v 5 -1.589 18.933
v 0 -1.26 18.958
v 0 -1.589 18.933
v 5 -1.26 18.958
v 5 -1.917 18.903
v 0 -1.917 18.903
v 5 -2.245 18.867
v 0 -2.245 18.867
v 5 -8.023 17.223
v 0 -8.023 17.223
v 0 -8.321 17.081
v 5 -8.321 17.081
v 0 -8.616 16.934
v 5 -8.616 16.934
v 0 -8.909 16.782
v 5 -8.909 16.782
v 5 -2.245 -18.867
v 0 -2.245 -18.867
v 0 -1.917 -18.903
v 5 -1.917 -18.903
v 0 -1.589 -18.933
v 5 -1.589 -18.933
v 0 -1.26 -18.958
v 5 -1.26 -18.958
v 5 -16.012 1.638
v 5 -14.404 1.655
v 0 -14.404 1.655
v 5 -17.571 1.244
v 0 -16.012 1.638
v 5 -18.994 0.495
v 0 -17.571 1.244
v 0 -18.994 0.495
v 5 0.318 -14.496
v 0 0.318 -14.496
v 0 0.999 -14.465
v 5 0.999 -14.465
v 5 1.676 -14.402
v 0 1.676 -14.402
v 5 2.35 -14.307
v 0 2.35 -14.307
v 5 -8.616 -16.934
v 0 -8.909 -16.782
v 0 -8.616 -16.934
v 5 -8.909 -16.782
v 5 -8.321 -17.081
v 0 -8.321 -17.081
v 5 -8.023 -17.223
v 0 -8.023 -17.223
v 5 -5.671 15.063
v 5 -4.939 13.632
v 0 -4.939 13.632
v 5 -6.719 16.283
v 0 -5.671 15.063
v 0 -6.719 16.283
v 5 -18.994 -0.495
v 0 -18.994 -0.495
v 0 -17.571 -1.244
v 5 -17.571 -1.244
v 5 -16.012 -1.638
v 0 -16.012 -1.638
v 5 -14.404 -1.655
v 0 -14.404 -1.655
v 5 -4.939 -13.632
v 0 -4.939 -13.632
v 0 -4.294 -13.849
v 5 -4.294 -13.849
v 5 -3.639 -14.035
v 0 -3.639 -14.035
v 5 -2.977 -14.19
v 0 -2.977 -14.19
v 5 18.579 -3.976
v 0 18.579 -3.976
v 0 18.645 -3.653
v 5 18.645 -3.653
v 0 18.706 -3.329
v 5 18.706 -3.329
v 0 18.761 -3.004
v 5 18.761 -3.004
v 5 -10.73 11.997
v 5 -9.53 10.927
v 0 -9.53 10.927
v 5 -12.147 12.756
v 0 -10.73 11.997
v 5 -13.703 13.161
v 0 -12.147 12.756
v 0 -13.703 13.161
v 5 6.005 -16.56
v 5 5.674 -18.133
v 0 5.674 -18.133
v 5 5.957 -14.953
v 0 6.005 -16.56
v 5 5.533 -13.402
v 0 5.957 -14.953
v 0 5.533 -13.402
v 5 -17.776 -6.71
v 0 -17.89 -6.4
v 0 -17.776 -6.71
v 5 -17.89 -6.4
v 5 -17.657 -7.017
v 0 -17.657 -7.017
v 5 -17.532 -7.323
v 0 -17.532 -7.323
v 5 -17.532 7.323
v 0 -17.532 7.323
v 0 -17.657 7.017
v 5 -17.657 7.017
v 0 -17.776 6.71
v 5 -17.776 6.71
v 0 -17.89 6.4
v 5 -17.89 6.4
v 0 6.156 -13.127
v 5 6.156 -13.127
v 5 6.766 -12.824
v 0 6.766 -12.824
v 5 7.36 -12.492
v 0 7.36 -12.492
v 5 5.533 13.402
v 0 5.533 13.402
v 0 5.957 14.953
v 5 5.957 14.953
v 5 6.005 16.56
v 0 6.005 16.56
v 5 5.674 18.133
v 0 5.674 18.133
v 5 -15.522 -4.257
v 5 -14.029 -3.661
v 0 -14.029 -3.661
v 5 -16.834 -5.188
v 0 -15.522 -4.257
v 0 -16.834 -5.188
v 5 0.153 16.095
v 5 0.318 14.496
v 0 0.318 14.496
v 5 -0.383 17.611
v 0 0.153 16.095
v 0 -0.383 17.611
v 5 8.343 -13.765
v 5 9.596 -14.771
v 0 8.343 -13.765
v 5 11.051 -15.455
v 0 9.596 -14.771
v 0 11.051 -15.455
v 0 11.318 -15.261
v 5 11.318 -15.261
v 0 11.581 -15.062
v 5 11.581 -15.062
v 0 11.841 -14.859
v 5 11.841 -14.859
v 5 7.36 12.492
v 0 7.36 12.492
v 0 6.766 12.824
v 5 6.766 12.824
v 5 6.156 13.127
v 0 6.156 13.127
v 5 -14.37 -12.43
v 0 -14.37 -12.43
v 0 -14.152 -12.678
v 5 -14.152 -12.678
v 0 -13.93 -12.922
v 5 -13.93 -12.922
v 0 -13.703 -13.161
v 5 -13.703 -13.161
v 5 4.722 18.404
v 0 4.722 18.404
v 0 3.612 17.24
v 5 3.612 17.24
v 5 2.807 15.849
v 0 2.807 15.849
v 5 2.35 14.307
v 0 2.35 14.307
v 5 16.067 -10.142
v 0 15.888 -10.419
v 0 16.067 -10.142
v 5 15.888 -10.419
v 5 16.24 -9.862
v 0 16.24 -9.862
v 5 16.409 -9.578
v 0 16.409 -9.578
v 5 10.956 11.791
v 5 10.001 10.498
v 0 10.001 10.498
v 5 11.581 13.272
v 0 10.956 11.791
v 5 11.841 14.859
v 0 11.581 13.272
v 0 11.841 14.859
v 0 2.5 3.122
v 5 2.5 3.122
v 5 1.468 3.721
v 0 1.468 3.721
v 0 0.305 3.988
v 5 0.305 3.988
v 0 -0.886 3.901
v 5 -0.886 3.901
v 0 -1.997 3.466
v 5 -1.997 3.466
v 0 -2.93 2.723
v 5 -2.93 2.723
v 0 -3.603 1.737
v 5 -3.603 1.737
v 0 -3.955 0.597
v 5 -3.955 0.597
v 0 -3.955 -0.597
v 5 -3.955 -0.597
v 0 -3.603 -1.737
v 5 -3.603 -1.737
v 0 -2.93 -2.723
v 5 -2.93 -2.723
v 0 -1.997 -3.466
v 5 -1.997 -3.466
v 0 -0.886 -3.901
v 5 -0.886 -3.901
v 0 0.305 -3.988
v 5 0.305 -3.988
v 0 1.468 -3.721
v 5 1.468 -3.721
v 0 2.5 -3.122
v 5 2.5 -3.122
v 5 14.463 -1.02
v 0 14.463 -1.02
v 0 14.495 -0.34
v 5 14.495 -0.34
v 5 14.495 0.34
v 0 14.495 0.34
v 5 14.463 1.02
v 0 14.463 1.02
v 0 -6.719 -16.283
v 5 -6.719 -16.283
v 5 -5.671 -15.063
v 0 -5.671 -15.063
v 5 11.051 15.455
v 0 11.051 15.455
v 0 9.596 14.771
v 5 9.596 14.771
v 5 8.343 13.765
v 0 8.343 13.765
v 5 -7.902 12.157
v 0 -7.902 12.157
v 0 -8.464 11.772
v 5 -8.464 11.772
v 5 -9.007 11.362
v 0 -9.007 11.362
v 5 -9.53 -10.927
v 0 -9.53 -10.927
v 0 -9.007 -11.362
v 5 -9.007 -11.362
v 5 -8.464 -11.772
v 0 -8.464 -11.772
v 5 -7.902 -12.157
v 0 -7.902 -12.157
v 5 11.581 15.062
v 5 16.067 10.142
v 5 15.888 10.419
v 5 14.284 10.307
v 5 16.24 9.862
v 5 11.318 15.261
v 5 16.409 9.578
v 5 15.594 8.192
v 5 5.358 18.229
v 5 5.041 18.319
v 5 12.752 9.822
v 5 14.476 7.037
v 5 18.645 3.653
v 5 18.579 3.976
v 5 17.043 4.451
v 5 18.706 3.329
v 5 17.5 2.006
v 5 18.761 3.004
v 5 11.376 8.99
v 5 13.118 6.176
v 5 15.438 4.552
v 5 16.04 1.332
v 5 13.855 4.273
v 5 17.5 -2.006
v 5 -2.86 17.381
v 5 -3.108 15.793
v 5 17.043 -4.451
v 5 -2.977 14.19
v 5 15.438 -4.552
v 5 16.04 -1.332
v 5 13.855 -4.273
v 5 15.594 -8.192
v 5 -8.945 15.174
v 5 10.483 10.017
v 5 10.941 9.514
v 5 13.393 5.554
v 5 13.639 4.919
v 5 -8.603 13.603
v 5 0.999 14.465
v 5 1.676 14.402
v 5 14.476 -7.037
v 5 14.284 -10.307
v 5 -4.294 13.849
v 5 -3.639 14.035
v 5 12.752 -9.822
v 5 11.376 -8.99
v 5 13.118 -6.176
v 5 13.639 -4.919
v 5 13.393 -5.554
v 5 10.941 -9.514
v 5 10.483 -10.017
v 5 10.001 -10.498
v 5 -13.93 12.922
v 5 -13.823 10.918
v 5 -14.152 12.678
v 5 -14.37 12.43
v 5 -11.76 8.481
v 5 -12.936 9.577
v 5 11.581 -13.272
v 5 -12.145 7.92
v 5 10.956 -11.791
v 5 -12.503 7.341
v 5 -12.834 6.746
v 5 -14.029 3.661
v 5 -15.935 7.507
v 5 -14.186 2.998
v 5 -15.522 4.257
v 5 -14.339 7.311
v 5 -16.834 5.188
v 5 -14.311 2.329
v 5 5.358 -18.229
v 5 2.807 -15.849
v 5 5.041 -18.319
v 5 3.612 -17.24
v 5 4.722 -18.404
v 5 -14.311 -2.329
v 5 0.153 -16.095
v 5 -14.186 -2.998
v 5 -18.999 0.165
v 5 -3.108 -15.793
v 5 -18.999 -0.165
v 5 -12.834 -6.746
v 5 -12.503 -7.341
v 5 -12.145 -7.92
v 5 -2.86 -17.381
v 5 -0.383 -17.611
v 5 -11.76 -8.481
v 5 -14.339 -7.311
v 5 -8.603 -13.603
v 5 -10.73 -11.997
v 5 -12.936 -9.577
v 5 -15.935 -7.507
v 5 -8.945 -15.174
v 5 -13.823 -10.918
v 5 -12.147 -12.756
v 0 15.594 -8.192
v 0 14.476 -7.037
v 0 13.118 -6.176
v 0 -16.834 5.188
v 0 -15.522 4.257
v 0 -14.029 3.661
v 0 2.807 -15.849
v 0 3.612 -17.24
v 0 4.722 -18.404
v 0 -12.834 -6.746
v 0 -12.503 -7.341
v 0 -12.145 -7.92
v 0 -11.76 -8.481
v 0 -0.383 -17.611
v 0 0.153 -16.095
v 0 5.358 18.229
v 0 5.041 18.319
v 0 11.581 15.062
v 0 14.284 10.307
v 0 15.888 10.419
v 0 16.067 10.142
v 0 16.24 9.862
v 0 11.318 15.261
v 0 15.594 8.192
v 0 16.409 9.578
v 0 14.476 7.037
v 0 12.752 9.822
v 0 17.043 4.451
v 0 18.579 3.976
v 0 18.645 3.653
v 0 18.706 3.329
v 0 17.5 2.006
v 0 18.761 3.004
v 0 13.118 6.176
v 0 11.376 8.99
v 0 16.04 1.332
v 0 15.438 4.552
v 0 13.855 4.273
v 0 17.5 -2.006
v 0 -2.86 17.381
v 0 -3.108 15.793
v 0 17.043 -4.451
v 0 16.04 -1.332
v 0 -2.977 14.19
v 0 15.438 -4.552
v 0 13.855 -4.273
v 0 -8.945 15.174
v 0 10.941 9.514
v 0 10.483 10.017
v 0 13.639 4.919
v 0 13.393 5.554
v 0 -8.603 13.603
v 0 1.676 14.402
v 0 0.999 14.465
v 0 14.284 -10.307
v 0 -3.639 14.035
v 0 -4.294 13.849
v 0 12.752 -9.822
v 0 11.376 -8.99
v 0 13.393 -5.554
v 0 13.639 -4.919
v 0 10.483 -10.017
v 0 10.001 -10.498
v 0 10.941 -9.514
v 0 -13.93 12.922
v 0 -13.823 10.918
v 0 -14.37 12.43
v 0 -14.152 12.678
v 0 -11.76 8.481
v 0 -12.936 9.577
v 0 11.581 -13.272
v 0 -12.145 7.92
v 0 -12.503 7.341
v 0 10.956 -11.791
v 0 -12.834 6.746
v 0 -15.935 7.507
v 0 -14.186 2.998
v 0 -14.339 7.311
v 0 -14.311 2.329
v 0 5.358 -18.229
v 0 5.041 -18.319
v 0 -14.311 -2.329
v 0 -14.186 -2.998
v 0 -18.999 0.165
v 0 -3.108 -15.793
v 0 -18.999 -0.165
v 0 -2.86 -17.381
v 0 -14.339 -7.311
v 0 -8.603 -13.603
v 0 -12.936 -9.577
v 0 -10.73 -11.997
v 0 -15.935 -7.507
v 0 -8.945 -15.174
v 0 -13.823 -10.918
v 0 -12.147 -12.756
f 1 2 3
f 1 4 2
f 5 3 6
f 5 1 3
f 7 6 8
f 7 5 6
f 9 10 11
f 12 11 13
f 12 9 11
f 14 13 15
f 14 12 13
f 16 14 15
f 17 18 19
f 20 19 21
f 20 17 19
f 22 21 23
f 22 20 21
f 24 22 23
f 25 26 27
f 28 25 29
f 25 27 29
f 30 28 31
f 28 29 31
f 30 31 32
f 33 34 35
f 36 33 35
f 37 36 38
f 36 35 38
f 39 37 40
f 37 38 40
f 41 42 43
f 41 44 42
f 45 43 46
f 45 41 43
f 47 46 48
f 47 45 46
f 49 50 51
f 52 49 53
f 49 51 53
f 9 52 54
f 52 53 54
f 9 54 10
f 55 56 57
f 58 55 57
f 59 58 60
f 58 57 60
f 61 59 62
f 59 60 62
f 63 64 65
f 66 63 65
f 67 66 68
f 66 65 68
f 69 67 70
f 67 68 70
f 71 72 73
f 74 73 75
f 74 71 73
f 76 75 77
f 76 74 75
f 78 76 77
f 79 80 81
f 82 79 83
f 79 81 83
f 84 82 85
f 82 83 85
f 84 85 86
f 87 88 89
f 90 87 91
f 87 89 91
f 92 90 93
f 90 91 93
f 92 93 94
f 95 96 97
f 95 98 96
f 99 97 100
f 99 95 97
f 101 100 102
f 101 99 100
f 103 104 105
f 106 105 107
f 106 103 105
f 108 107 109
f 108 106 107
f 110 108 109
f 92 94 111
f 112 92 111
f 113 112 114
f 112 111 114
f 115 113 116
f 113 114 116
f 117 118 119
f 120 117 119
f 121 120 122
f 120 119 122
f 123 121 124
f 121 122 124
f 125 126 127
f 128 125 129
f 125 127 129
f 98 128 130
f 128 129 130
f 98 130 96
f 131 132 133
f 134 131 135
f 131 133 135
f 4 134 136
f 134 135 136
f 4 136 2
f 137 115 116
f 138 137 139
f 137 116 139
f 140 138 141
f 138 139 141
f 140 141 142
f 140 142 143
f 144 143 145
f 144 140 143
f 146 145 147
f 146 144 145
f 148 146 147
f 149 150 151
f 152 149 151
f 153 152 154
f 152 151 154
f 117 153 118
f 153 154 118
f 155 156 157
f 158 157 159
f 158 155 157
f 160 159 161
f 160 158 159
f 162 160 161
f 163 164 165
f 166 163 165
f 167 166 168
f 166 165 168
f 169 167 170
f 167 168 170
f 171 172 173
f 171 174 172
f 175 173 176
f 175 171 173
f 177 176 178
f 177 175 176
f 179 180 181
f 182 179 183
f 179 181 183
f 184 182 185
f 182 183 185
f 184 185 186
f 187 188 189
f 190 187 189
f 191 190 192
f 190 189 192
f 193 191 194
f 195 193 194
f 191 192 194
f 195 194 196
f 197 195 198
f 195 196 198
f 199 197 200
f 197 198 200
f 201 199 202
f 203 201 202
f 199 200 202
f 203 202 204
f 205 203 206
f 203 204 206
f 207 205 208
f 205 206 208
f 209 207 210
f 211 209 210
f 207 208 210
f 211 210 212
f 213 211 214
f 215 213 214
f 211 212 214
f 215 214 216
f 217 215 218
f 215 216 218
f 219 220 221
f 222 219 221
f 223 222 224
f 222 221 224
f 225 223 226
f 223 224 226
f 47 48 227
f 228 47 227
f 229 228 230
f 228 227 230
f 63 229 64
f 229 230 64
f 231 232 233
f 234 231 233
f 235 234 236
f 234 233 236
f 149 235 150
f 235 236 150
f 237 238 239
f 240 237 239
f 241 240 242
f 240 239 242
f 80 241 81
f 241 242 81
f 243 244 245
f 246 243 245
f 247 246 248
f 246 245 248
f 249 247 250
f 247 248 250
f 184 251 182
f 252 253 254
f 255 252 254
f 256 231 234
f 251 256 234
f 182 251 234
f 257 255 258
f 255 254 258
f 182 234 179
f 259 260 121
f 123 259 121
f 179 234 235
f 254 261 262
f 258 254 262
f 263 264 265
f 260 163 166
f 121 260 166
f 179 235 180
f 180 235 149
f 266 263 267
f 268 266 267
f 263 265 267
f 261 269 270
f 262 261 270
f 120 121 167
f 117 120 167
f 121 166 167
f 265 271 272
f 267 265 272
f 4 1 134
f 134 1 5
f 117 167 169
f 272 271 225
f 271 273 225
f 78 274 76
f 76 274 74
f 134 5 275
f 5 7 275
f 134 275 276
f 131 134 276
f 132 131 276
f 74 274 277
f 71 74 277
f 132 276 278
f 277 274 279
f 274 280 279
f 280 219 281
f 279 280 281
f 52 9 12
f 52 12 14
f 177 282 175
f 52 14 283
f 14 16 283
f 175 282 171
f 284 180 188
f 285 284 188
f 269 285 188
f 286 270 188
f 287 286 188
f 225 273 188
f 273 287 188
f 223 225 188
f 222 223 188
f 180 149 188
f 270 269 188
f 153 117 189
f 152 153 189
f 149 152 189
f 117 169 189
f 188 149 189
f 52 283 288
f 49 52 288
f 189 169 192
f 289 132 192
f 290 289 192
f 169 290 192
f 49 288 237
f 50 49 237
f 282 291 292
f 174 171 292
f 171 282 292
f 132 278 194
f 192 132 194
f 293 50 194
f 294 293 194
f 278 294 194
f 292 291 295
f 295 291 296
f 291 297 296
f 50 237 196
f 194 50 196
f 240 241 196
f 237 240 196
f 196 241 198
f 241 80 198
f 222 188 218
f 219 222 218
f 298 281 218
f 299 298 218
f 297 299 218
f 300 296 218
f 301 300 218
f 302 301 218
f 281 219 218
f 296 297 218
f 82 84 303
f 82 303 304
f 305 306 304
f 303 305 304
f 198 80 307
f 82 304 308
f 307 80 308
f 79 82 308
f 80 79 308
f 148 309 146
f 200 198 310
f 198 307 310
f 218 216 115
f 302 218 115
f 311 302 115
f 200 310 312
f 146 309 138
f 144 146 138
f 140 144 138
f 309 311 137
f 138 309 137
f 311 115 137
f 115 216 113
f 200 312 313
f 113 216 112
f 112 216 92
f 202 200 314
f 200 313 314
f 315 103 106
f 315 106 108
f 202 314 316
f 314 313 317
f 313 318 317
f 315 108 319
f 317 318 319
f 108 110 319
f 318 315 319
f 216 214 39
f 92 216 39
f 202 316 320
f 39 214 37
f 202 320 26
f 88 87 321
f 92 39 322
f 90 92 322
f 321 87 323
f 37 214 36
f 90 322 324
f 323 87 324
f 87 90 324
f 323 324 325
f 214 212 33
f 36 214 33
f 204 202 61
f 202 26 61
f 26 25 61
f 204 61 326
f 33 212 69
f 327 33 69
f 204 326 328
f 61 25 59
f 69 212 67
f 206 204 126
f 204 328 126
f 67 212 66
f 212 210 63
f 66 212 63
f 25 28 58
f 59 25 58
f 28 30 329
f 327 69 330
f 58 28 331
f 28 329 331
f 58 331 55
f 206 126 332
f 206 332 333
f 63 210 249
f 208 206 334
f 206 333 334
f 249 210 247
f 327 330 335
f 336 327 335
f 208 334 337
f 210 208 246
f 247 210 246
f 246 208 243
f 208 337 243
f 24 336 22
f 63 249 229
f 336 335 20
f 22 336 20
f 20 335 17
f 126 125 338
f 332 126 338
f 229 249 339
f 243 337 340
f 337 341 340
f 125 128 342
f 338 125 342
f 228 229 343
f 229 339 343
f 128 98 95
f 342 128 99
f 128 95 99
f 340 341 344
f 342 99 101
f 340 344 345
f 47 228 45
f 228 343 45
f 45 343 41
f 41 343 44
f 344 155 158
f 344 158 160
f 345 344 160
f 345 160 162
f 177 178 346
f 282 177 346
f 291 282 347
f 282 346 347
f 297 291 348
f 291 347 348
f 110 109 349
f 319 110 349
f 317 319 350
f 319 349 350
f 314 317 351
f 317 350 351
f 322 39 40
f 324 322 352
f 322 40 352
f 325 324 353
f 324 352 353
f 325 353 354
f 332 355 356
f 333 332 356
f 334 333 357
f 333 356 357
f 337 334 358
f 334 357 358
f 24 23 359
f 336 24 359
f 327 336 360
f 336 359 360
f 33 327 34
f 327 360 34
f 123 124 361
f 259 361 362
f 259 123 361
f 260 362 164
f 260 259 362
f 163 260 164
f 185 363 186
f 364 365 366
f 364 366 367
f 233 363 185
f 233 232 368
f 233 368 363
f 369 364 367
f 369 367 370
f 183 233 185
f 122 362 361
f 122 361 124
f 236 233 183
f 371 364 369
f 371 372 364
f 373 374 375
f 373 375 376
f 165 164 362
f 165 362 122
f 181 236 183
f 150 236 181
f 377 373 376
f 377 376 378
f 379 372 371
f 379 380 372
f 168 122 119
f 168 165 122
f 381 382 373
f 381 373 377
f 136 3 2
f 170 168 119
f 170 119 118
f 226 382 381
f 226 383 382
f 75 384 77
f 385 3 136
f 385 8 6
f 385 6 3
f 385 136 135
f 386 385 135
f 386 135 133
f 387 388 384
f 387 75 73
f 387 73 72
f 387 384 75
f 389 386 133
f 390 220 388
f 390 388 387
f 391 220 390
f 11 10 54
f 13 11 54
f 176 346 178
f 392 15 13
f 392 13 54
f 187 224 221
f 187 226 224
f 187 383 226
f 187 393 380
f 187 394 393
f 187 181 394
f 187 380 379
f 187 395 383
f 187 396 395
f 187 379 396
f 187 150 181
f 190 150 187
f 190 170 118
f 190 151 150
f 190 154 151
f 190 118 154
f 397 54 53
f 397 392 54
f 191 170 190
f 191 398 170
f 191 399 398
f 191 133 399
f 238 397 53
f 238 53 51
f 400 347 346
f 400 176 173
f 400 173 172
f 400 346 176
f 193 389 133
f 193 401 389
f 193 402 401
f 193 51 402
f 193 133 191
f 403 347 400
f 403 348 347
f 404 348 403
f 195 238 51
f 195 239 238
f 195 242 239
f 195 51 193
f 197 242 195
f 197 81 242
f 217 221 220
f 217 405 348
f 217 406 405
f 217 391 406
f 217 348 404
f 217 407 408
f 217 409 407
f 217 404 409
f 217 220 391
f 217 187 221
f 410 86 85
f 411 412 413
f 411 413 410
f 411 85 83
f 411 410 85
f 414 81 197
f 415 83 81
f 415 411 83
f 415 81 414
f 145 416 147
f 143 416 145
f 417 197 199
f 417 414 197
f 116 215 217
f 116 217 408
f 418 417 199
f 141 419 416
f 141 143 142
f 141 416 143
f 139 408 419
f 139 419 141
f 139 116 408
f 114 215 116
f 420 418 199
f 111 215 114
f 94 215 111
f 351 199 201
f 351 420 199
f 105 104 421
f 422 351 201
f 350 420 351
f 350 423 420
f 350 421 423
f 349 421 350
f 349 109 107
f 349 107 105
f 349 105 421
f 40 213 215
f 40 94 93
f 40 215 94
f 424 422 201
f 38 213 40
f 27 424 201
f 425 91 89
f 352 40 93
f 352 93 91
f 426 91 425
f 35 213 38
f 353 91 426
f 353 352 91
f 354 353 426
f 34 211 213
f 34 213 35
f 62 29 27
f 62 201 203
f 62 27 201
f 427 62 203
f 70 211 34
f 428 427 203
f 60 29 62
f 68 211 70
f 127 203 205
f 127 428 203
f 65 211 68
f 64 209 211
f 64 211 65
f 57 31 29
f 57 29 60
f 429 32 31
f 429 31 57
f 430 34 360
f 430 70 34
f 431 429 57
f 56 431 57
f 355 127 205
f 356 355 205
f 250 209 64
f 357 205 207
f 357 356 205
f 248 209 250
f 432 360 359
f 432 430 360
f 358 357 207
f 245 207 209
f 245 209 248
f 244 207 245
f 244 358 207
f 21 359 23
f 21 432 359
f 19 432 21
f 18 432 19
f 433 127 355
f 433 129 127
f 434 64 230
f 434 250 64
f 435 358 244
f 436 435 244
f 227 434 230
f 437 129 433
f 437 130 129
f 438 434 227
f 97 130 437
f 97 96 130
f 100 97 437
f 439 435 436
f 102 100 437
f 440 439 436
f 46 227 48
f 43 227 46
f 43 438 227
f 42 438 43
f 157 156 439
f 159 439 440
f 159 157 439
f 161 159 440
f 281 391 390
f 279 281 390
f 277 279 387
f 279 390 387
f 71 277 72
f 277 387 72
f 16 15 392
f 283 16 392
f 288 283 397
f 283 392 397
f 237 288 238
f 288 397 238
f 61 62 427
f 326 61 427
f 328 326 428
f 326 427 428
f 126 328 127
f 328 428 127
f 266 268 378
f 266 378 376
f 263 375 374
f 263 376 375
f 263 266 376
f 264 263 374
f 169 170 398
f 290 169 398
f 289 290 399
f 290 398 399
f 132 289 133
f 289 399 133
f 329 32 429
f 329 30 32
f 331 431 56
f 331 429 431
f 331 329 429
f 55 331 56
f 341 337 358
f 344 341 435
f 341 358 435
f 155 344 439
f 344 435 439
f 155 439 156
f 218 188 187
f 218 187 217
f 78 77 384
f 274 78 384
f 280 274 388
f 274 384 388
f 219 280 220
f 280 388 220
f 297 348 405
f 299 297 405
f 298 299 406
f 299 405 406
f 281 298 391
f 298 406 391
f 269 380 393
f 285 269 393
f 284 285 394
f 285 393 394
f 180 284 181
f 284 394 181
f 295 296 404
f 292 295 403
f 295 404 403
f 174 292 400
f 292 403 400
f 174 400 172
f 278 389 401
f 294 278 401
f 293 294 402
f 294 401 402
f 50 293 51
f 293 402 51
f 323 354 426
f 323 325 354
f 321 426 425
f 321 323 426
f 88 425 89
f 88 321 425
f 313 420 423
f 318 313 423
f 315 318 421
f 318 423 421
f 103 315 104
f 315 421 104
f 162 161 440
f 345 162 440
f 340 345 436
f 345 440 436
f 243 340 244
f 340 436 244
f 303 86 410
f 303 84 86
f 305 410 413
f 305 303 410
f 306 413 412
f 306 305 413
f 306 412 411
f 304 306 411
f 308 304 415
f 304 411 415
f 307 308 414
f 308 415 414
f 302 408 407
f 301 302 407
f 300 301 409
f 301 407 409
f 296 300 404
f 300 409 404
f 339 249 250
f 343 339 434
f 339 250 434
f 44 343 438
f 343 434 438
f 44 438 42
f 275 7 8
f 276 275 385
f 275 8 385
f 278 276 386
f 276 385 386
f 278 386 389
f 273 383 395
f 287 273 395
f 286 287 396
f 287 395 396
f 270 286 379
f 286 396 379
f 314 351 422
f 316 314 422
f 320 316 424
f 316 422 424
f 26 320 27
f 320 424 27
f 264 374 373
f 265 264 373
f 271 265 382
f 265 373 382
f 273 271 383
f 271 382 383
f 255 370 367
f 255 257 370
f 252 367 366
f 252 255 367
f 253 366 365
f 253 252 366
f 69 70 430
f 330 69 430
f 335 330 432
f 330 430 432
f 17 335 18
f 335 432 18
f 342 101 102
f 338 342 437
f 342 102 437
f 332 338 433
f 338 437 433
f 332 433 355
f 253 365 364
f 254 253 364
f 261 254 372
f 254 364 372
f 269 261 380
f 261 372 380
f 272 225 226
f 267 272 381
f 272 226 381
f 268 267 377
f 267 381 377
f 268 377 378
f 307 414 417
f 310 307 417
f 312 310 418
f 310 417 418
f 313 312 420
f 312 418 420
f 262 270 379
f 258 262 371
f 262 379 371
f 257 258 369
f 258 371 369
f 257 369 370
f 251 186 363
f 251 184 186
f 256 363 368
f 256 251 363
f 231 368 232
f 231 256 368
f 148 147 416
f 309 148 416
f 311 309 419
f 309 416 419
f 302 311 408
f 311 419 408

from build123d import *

# Parameters (mm, degrees)
BASPROSKE_W         = 5
BASPROSKE_H         = 19
TOOTHCUT_DEPTH      = 28.331300737
TEETHCUTS_COUNT     = 17
BORSKE_R            = 4
BORE_DEPTH          = 50.0000508
BOSS_EXTRUDE1_DEPTH = 5


with BuildPart() as part:
    # BasProSke → Base-Revolve (revolve)
    with BuildSketch(Plane(origin=(0, 0, 0), x_dir=(1, 0, 0), z_dir=(0, 1, 0)), mode=Mode.PRIVATE) as base_revolve_sk:
        with Locations((2.5, 9.5)):
            Rectangle(BASPROSKE_W, BASPROSKE_H)
    revolve(base_revolve_sk.sketch.rotate(Axis((-10, 0, 0), (1, 0, 0)), 180), axis=Axis((-10, 0, 0), (1, 0, 0)))

    # TooCutSke → ToothCut (cut, through all)
    with BuildSketch(Plane(origin=(0, 0, 0), x_dir=(0, 0, -1), z_dir=(1, 0, 0))):
        with BuildLine():
            ThreePointArc((1.020352389, 14.463052306), (0, 14.499), (-1.020352389, 14.463052306))
            ThreePointArc((-1.020352389, 14.463052306), (-1.632621885, 16.804485203), (-3.026143023, 18.783192049))
            ThreePointArc((-3.026143023, 18.783192049), (0, 19.0254), (3.026143023, 18.783192049))
            ThreePointArc((3.026143023, 18.783192049), (1.632621885, 16.804485203), (1.020352389, 14.463052306))
        make_face()
    toothcut = extrude(amount=TOOTHCUT_DEPTH, mode=Mode.SUBTRACT)

    # TeethCuts: ToothCut ×17 about axis
    teethcuts_axis = Axis((0, 0, 0), (1, 0, 0))
    for i in range(1, TEETHCUTS_COUNT):
        add(toothcut.rotate(teethcuts_axis, i * 360 / TEETHCUTS_COUNT), mode=Mode.SUBTRACT)

    # BorSke → Bore (cut, symmetric)
    with BuildSketch(Plane(origin=(0, 0, 0), x_dir=(0, 0, -1), z_dir=(1, 0, 0))):
        with Locations(Location((0, 0, 0), (0, 0, 180))):
            Circle(BORSKE_R)
    extrude(amount=BORE_DEPTH, both=True, mode=Mode.SUBTRACT)

    # Sketch1 → Boss-Extrude1 (add)
    with BuildSketch(Plane(origin=(5, 0, 0), x_dir=(0, 0, -1), z_dir=(1, 0, 0))):
        with BuildLine():
            ThreePointArc((3.122498999, 2.5), (0, 4), (-3.122498999, 2.5))
            Line((-3.122498999, 2.5), (3.122498999, 2.5))
        make_face()
    extrude(amount=-BOSS_EXTRUDE1_DEPTH)


solid = part.part
